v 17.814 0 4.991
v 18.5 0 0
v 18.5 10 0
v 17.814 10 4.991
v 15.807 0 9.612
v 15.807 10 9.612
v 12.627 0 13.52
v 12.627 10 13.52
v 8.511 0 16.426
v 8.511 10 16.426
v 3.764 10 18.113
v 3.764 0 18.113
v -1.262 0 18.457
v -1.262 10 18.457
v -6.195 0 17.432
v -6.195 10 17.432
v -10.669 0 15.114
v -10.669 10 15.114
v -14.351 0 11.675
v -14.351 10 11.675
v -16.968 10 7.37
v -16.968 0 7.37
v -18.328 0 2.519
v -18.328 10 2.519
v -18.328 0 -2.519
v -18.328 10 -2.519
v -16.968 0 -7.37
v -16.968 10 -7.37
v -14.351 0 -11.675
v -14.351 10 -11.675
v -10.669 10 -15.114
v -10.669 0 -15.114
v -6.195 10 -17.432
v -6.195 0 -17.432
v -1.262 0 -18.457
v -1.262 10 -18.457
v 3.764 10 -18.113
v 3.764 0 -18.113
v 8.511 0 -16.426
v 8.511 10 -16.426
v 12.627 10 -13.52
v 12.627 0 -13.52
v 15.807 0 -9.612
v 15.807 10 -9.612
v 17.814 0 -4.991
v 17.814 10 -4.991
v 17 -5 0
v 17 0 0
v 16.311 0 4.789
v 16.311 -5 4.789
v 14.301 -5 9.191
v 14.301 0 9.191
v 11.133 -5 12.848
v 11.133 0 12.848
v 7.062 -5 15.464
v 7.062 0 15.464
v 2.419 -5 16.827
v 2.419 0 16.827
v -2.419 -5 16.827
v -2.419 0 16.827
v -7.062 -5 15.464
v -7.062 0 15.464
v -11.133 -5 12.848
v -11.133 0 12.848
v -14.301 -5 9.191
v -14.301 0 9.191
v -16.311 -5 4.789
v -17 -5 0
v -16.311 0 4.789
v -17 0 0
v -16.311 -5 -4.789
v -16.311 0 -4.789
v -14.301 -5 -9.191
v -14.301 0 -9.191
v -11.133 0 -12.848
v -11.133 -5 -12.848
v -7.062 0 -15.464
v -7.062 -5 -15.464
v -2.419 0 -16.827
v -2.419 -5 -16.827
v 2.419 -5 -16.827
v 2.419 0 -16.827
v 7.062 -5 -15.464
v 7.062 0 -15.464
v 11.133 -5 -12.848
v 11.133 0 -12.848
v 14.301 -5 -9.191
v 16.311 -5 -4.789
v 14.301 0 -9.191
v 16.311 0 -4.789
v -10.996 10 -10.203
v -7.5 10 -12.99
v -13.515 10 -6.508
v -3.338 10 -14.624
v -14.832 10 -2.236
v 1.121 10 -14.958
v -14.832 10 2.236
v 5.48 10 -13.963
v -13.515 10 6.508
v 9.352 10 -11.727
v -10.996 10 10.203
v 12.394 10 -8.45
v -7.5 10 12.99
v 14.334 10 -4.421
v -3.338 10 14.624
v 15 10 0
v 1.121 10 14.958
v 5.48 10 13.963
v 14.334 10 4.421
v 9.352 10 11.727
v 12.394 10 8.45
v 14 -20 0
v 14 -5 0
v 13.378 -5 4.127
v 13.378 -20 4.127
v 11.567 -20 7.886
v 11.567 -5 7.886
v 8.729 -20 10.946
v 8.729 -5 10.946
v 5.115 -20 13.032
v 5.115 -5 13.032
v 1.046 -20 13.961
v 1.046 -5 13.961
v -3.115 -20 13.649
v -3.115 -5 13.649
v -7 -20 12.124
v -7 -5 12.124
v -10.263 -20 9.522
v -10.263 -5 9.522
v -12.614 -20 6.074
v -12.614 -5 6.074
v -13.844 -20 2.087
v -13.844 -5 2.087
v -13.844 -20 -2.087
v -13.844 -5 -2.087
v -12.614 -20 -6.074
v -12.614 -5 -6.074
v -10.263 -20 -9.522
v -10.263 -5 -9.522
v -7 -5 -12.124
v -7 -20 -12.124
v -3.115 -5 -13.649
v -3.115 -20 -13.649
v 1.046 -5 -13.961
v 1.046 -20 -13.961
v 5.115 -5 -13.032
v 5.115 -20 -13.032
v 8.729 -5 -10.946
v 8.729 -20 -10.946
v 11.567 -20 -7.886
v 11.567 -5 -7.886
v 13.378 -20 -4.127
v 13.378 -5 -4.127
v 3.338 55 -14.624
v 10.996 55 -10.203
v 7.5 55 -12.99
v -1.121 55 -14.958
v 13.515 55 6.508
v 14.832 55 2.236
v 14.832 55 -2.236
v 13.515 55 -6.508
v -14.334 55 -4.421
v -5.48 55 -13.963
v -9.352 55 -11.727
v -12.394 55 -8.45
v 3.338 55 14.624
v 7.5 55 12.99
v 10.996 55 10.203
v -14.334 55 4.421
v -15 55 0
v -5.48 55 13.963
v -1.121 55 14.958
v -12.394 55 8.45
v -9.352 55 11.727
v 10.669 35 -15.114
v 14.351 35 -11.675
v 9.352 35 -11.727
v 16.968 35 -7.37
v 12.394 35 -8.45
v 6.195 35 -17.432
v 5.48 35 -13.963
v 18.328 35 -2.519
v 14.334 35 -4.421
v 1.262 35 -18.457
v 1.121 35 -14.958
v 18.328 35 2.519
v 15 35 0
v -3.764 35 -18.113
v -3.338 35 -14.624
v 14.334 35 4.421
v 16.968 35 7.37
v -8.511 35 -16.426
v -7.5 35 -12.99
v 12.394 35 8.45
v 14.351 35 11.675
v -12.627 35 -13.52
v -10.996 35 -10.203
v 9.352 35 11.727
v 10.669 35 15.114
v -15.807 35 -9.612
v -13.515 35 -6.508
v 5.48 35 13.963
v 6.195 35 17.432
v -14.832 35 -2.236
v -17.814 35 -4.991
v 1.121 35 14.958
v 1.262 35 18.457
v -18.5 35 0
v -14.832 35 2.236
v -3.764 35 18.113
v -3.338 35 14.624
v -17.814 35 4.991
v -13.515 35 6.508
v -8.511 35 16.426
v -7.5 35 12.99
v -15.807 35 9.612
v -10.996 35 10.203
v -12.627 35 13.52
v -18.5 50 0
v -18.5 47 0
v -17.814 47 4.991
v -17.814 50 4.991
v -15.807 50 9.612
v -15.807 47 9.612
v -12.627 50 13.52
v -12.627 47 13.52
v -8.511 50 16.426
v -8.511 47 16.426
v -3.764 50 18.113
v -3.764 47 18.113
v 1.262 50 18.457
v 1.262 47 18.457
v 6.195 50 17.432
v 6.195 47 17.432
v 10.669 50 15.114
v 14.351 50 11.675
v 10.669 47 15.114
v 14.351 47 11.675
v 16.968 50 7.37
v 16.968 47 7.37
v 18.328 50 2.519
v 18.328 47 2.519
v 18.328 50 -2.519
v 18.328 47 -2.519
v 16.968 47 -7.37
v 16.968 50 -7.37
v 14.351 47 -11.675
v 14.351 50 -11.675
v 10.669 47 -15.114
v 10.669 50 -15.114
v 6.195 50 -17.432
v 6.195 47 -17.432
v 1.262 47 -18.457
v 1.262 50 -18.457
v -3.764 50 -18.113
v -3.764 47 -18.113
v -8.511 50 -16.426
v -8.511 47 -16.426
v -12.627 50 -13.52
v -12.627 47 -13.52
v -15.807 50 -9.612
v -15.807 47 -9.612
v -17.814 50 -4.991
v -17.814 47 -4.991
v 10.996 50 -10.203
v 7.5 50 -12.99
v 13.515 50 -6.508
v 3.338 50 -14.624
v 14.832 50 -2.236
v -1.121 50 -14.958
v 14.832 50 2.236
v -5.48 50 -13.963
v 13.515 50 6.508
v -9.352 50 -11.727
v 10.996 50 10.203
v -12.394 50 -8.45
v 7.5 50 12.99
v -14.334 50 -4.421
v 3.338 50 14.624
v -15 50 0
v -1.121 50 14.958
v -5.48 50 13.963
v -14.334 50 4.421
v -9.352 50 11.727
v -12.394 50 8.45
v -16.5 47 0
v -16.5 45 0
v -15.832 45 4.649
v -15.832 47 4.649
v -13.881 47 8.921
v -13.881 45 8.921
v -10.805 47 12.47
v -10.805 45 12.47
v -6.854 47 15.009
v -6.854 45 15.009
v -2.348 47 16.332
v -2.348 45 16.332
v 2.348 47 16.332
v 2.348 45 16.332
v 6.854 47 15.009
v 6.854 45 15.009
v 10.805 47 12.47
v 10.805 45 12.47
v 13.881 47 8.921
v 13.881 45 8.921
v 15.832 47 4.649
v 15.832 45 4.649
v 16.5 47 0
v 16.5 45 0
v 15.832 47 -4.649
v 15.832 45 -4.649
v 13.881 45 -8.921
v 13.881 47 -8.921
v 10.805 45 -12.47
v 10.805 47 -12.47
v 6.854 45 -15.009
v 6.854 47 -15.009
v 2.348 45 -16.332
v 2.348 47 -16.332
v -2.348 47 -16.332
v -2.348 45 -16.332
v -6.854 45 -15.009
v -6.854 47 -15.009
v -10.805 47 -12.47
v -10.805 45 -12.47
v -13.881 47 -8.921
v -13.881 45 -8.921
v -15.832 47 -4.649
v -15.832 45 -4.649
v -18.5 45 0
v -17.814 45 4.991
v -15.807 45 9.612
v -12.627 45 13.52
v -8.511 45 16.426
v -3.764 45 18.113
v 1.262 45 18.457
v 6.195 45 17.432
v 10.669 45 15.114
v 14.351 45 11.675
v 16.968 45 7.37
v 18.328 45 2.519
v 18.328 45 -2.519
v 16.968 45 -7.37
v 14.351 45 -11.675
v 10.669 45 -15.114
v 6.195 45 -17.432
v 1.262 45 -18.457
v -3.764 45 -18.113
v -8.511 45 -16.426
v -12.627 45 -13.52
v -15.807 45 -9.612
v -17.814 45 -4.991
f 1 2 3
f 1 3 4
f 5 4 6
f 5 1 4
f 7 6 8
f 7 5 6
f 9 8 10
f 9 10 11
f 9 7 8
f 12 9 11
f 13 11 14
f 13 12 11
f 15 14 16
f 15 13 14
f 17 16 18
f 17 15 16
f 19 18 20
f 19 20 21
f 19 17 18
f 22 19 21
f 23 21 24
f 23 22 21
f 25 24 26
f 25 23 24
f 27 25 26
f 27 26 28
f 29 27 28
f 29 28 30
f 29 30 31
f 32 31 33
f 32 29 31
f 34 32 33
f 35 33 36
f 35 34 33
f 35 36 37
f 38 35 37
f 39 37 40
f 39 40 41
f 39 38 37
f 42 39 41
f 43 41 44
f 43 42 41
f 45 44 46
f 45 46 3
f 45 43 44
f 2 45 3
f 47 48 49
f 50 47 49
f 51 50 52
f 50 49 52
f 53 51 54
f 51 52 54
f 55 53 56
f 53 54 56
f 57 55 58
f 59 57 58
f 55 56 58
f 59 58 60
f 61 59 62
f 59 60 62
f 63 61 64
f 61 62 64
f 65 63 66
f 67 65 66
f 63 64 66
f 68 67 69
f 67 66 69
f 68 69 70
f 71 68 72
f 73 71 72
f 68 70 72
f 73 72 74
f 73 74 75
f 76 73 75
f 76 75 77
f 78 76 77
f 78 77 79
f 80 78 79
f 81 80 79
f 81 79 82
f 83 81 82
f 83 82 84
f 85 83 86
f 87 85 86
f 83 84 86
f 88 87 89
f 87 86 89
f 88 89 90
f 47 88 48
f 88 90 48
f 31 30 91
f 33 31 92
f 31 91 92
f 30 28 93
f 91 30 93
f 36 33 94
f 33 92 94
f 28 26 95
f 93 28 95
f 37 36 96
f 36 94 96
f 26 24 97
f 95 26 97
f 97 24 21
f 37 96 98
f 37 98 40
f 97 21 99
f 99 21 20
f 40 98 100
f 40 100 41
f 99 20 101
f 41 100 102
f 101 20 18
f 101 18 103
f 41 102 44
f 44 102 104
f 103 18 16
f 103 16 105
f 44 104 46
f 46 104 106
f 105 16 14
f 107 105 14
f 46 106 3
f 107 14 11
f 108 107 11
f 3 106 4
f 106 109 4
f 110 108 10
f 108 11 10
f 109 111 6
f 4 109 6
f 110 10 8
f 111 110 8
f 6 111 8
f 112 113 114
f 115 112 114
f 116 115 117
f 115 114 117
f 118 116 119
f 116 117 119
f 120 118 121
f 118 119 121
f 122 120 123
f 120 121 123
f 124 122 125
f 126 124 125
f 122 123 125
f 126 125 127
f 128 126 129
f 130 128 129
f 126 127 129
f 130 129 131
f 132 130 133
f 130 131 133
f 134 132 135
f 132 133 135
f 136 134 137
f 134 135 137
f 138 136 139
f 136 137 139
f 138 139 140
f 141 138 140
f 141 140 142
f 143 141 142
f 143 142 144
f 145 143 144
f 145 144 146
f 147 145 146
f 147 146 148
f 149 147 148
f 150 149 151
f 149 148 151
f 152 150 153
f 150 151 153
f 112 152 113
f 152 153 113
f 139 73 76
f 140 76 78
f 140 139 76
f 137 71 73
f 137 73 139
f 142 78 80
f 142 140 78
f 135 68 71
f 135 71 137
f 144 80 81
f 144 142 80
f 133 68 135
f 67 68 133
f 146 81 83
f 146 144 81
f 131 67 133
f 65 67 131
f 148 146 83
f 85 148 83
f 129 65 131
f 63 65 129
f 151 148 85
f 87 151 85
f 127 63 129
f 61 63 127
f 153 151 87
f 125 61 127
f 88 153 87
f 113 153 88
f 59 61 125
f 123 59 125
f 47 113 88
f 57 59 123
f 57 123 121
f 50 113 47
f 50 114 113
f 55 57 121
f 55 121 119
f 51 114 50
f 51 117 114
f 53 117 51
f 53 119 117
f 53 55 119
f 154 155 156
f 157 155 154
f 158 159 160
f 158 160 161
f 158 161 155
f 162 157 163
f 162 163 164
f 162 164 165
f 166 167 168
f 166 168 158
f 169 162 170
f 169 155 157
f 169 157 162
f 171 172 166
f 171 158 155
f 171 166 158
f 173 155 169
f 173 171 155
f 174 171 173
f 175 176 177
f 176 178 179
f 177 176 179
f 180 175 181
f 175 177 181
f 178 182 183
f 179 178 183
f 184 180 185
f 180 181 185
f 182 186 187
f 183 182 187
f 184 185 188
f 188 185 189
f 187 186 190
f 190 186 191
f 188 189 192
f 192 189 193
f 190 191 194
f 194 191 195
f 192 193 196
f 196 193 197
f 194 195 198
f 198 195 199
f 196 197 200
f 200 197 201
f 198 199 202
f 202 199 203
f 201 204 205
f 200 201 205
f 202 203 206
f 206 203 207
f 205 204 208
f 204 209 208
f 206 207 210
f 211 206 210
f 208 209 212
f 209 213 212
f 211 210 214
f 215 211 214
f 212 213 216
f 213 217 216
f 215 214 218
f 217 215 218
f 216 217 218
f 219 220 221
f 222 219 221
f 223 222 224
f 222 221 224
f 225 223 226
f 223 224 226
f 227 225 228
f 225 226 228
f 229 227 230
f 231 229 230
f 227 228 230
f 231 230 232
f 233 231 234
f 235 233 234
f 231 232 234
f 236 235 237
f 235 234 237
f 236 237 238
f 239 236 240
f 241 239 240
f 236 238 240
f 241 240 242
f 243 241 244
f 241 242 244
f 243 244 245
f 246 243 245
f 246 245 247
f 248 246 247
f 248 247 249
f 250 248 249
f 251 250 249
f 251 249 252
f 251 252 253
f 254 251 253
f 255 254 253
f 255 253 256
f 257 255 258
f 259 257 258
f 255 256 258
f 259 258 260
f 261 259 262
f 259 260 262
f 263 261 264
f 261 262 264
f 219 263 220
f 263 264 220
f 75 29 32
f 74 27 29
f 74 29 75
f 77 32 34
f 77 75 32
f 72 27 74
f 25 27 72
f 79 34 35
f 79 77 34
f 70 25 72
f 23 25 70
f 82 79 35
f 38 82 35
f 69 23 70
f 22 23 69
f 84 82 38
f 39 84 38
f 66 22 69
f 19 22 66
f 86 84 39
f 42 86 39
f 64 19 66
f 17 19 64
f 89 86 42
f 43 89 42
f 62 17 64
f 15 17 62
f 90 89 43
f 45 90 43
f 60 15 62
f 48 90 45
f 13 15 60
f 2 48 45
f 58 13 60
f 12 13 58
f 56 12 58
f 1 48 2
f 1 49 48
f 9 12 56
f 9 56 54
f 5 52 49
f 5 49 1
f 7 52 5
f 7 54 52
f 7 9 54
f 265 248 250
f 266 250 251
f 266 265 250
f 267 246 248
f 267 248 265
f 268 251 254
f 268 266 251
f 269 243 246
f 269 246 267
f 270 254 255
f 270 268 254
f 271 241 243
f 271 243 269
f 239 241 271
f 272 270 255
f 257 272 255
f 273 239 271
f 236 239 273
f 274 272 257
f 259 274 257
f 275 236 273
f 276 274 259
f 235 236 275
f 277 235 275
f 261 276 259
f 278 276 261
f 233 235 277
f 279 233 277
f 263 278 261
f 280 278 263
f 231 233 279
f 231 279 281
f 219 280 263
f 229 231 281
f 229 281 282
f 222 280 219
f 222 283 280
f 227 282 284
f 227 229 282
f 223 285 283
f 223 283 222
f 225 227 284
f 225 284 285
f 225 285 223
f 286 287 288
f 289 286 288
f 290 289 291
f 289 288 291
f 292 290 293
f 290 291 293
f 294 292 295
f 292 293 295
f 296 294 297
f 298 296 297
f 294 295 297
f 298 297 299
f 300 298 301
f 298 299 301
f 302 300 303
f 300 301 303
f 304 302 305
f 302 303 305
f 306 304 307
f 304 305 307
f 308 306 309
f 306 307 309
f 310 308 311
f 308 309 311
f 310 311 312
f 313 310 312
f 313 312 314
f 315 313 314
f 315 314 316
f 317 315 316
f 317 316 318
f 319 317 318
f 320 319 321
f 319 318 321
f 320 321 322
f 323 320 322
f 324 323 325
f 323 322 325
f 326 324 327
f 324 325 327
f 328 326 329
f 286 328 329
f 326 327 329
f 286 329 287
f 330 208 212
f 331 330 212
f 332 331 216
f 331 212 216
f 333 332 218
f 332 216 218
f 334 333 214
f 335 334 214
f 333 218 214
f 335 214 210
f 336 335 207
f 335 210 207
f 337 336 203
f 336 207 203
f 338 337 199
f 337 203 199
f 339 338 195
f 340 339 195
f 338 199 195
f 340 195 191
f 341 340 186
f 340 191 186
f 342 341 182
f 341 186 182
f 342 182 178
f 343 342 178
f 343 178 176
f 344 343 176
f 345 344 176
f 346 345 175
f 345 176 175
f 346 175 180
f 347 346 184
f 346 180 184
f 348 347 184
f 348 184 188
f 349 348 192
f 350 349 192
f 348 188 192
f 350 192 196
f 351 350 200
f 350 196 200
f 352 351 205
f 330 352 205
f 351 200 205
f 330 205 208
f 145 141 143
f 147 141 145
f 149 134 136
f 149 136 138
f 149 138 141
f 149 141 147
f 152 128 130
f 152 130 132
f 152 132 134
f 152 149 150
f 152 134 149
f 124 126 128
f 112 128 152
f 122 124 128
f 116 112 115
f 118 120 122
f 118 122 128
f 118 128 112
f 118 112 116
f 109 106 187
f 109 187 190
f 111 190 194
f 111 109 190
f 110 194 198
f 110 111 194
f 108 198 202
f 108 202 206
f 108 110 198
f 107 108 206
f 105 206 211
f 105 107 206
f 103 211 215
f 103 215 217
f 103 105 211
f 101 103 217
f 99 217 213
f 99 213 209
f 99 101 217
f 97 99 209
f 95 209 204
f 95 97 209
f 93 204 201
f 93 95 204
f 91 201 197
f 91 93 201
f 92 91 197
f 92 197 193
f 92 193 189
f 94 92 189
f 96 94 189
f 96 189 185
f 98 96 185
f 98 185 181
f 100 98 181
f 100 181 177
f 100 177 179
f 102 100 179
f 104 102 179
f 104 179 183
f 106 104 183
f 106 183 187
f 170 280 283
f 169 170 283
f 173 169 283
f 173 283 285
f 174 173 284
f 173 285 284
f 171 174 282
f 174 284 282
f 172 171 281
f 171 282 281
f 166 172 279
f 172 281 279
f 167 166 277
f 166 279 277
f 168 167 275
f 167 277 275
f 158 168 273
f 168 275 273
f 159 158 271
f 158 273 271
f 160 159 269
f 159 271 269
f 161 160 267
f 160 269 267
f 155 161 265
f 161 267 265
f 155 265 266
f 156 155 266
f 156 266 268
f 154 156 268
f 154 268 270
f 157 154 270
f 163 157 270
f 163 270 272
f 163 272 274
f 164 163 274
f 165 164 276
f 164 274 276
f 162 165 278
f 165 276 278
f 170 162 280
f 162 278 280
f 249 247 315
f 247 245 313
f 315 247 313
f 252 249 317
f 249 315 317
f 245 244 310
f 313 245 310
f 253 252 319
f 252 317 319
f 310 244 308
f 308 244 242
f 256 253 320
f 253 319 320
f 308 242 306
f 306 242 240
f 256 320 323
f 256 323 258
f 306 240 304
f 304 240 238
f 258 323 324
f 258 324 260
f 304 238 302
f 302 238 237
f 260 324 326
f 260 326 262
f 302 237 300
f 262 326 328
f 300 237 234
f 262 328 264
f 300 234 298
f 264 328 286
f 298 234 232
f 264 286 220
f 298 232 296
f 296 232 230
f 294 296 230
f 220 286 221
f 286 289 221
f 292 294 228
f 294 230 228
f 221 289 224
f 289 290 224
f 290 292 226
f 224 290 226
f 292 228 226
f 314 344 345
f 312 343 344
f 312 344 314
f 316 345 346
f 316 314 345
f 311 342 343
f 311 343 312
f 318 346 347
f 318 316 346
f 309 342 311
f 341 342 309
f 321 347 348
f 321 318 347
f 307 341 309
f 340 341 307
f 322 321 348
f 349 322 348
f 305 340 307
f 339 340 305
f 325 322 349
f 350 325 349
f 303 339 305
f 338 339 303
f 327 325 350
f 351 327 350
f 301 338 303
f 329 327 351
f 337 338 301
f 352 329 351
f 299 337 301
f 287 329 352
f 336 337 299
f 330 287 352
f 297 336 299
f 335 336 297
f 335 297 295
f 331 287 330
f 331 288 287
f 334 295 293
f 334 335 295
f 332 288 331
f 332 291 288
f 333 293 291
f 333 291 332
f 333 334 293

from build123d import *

# Parameters (mm, degrees)
F0_R      = 17
F1_DEPTH  = 5
F2_R      = 14
F3_DEPTH  = 15
F4_R      = 18.5
F5_DEPTH  = 10
F6_R      = 15
F7_DEPTH  = 35
F8_R      = 18.5
F9_DEPTH  = 10
F10_R     = 16.5
F11_DEPTH = 2
F12_R     = 18.5
F13_DEPTH = 3
F14_R     = 15
F15_DEPTH = 5


with BuildPart() as f1:
    # F0 (on Front) → F1 (new body)
    with BuildSketch(Plane.XZ):
        Circle(F0_R)
    extrude(amount=F1_DEPTH)

    # F2 (on face) → F3 (join)
    with BuildSketch(Plane.XZ.offset(5)):
        Circle(F2_R)
    extrude(amount=F3_DEPTH)

    # F4 (on Front) → F5 (join)
    with BuildSketch(Plane.XZ):
        Circle(F4_R)
    extrude(amount=-F5_DEPTH)

    # F6 (on Front) → F7 (join)
    with BuildSketch(Plane.XZ):
        Circle(F6_R)
    extrude(amount=-F7_DEPTH)

    # F8 (on face) → F9 (join)
    with BuildSketch(Plane(origin=(0, 35, 0), x_dir=(-1, 0, 0), z_dir=(0, 1, 0))):
        Circle(F8_R)
    extrude(amount=F9_DEPTH)

    # F10 (on face) → F11 (join)
    with BuildSketch(Plane(origin=(0, 45, 0), x_dir=(-1, 0, 0), z_dir=(0, 1, 0))):
        Circle(F10_R)
    extrude(amount=F11_DEPTH)

    # F12 (on face) → F13 (join)
    with BuildSketch(Plane(origin=(0, 47, 0), x_dir=(-1, 0, 0), z_dir=(0, 1, 0))):
        Circle(F12_R)
    extrude(amount=F13_DEPTH)

    # F14 (on face) → F15 (join)
    with BuildSketch(Plane(origin=(0, 50, 0), x_dir=(-1, 0, 0), z_dir=(0, 1, 0))):
        Circle(F14_R)
    extrude(amount=F15_DEPTH)


solid = f1.part
